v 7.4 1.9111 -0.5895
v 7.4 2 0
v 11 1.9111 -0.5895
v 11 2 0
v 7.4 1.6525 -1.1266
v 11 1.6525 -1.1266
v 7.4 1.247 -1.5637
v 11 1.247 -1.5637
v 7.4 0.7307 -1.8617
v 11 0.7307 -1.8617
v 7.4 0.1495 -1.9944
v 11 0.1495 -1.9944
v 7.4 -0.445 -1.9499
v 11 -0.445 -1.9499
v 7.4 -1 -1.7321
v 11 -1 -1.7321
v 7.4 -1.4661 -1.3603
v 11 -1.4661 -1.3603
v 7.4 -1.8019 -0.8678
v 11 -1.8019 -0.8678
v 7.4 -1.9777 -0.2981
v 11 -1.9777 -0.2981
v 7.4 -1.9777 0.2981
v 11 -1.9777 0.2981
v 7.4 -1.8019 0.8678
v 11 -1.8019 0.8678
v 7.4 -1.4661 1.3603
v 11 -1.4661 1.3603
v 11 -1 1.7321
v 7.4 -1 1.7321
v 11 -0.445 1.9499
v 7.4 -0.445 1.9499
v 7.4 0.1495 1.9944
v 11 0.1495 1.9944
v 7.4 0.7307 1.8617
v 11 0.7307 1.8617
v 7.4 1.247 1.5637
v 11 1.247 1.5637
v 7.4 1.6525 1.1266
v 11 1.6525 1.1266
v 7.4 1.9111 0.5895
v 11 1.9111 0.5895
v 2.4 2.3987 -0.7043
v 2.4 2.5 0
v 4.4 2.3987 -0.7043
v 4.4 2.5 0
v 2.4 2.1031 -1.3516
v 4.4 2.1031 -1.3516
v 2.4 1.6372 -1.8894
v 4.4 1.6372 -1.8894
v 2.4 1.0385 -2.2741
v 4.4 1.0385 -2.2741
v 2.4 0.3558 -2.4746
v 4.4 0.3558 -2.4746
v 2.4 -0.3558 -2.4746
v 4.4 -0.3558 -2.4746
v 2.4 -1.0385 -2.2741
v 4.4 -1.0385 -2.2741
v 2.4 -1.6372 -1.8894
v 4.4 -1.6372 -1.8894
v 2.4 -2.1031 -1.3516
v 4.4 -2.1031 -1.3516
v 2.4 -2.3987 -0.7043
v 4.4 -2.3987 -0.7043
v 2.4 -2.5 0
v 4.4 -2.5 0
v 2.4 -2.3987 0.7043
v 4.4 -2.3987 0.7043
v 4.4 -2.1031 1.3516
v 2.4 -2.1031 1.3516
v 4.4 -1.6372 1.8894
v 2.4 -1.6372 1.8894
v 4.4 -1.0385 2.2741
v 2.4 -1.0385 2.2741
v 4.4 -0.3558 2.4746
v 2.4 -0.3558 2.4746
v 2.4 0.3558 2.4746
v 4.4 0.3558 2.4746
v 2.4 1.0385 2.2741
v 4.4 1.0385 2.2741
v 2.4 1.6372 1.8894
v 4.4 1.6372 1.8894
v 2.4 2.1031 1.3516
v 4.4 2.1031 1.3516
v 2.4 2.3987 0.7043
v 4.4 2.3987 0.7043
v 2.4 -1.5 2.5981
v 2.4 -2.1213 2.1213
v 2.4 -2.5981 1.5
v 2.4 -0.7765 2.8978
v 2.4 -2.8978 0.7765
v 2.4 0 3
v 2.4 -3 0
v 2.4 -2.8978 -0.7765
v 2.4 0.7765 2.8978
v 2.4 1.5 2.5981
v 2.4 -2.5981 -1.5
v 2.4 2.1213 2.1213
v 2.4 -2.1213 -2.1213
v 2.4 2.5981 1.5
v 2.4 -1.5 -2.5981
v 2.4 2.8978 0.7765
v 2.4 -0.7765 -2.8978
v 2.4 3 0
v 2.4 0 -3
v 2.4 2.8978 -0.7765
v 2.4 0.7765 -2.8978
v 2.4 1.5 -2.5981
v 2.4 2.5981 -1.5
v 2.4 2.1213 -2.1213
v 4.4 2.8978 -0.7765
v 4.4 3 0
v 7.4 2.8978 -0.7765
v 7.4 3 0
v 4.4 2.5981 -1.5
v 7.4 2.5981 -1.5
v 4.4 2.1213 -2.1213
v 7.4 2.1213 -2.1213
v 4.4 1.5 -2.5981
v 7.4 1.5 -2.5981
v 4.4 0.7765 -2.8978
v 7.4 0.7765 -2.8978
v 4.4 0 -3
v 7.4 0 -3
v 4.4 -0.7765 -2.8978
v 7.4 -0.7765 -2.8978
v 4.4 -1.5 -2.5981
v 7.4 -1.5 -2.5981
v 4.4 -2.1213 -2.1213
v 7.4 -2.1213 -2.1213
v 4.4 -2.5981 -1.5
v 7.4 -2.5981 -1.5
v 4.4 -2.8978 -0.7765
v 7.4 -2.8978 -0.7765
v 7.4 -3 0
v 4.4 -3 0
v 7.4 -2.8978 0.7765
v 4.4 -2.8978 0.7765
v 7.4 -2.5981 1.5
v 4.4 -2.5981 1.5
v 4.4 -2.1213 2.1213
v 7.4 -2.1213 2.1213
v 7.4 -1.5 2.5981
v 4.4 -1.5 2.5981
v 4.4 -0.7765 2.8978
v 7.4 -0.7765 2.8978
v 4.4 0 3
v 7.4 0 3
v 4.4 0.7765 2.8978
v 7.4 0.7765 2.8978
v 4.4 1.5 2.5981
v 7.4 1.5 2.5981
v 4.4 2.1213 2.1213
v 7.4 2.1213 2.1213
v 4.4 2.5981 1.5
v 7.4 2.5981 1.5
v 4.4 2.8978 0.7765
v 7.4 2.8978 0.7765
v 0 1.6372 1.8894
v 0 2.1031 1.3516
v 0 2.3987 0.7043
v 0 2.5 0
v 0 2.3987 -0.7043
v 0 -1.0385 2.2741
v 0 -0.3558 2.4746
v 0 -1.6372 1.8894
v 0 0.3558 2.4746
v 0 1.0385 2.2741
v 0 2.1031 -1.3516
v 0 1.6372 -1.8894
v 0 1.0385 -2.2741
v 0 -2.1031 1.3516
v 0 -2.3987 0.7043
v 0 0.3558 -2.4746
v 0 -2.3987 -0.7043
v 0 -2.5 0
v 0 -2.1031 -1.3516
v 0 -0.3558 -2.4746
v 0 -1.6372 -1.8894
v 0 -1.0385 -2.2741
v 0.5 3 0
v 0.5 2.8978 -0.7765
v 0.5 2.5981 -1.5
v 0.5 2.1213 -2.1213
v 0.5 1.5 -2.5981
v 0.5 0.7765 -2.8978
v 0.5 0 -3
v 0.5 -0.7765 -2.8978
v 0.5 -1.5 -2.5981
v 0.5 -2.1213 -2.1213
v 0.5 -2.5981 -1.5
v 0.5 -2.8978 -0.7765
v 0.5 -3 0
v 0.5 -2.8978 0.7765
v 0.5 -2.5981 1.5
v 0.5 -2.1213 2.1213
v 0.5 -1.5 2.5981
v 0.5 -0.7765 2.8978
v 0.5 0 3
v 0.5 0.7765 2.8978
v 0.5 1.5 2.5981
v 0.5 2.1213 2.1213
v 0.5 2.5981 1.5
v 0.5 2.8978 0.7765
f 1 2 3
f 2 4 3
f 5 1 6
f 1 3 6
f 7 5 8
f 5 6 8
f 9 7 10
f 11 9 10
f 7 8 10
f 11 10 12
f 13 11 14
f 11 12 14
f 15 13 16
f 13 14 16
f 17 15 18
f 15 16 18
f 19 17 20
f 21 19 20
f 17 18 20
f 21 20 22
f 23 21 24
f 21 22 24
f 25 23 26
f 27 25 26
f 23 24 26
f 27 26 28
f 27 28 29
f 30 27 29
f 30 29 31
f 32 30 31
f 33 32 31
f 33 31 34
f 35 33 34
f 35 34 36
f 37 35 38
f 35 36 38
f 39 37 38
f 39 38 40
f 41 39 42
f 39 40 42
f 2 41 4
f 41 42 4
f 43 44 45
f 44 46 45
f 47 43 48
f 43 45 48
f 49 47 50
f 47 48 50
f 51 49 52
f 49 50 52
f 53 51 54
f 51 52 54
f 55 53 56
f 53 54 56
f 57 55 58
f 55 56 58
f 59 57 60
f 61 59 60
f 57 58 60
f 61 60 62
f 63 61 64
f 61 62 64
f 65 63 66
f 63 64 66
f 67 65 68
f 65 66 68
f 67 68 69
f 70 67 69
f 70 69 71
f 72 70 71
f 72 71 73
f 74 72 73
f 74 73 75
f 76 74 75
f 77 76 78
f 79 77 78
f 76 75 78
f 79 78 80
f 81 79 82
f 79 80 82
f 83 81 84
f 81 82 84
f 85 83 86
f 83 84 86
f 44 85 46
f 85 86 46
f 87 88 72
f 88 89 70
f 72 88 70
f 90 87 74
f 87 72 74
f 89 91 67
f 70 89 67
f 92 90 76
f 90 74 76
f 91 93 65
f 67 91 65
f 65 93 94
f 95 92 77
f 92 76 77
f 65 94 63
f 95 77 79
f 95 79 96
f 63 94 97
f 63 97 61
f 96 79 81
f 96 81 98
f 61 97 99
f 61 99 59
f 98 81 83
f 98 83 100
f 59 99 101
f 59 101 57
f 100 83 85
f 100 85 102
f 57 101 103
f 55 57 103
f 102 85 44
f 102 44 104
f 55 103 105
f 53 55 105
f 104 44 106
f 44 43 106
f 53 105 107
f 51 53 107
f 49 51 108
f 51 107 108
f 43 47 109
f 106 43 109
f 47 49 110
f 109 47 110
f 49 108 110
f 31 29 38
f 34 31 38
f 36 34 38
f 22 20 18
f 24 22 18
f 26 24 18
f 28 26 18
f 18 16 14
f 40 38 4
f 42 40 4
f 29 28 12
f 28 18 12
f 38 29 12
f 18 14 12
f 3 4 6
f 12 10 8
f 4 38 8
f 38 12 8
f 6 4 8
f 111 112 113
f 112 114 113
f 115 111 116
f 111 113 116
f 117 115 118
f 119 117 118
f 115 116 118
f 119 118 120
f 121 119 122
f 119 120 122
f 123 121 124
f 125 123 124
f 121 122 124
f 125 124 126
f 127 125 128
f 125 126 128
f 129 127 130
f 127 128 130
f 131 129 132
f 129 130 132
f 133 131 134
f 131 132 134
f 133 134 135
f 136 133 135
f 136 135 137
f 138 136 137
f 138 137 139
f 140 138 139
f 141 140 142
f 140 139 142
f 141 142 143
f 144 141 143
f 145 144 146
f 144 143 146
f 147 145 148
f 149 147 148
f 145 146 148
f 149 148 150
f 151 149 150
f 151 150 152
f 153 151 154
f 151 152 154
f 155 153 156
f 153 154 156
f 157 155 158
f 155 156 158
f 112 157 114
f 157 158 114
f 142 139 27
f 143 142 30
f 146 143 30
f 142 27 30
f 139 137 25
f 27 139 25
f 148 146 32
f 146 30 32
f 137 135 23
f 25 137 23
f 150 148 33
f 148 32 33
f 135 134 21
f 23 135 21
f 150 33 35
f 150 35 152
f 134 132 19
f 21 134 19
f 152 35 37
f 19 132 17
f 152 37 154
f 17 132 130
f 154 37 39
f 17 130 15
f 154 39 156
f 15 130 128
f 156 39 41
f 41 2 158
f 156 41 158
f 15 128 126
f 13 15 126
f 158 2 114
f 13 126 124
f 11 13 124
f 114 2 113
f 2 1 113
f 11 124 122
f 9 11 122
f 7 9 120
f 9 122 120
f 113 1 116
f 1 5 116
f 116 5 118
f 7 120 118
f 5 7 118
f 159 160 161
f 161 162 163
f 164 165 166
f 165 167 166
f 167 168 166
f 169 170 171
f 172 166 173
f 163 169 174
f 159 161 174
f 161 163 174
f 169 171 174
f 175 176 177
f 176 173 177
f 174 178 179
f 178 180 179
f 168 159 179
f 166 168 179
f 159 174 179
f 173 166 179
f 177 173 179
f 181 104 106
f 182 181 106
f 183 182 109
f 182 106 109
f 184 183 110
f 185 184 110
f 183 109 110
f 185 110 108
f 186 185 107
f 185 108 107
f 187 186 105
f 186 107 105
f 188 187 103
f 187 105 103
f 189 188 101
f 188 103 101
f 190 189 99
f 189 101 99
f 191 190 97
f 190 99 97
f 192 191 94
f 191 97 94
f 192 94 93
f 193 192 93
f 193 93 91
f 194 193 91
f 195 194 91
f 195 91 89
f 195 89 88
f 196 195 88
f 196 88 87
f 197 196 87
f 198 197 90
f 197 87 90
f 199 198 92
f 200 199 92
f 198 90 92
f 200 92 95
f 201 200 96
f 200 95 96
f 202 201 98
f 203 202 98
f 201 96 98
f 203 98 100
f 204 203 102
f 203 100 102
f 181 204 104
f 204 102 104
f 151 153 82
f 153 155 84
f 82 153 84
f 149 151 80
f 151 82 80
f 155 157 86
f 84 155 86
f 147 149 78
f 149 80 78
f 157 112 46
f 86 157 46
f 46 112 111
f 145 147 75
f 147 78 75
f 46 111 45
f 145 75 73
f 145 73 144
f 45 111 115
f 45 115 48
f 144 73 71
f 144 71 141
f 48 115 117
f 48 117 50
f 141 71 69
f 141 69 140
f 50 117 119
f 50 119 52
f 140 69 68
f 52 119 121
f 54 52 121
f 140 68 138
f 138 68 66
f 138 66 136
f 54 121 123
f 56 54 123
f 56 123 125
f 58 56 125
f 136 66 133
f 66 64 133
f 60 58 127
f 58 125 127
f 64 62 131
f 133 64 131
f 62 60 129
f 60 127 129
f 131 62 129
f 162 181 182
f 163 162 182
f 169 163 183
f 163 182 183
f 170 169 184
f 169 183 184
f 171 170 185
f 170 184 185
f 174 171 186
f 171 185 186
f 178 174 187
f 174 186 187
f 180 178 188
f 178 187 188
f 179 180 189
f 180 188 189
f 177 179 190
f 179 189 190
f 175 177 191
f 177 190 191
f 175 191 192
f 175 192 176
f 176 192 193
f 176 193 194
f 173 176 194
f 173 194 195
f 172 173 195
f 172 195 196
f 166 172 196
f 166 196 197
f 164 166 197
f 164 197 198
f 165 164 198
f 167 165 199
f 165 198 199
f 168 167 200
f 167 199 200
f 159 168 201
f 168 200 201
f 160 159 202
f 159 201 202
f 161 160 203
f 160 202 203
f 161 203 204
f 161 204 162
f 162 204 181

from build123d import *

# Parameters (mm, degrees)
CHANFREIN1_SIZE = 0.5


with BuildPart() as part:
    # Esquisse1 → Révolution1 (revolve)
    with BuildSketch(Plane.XY):
        Polygon((0, 0), (0, 3), (2.4, 3), (2.4, 2.5), (4.4, 2.5), (4.4, 3), (7.4, 3), (7.4, 2), (11, 2), (11, 0), align=None)
    revolve(axis=Axis((11, 0, 0), (-1, 0, 0)))

    # Chanfrein1
    chanfrein1_edges = [part.edges().sort_by_distance(p)[0] for p in [
        (0, -3, 0),
    ]]
    chamfer(chanfrein1_edges, length=CHANFREIN1_SIZE)


solid = part.part
